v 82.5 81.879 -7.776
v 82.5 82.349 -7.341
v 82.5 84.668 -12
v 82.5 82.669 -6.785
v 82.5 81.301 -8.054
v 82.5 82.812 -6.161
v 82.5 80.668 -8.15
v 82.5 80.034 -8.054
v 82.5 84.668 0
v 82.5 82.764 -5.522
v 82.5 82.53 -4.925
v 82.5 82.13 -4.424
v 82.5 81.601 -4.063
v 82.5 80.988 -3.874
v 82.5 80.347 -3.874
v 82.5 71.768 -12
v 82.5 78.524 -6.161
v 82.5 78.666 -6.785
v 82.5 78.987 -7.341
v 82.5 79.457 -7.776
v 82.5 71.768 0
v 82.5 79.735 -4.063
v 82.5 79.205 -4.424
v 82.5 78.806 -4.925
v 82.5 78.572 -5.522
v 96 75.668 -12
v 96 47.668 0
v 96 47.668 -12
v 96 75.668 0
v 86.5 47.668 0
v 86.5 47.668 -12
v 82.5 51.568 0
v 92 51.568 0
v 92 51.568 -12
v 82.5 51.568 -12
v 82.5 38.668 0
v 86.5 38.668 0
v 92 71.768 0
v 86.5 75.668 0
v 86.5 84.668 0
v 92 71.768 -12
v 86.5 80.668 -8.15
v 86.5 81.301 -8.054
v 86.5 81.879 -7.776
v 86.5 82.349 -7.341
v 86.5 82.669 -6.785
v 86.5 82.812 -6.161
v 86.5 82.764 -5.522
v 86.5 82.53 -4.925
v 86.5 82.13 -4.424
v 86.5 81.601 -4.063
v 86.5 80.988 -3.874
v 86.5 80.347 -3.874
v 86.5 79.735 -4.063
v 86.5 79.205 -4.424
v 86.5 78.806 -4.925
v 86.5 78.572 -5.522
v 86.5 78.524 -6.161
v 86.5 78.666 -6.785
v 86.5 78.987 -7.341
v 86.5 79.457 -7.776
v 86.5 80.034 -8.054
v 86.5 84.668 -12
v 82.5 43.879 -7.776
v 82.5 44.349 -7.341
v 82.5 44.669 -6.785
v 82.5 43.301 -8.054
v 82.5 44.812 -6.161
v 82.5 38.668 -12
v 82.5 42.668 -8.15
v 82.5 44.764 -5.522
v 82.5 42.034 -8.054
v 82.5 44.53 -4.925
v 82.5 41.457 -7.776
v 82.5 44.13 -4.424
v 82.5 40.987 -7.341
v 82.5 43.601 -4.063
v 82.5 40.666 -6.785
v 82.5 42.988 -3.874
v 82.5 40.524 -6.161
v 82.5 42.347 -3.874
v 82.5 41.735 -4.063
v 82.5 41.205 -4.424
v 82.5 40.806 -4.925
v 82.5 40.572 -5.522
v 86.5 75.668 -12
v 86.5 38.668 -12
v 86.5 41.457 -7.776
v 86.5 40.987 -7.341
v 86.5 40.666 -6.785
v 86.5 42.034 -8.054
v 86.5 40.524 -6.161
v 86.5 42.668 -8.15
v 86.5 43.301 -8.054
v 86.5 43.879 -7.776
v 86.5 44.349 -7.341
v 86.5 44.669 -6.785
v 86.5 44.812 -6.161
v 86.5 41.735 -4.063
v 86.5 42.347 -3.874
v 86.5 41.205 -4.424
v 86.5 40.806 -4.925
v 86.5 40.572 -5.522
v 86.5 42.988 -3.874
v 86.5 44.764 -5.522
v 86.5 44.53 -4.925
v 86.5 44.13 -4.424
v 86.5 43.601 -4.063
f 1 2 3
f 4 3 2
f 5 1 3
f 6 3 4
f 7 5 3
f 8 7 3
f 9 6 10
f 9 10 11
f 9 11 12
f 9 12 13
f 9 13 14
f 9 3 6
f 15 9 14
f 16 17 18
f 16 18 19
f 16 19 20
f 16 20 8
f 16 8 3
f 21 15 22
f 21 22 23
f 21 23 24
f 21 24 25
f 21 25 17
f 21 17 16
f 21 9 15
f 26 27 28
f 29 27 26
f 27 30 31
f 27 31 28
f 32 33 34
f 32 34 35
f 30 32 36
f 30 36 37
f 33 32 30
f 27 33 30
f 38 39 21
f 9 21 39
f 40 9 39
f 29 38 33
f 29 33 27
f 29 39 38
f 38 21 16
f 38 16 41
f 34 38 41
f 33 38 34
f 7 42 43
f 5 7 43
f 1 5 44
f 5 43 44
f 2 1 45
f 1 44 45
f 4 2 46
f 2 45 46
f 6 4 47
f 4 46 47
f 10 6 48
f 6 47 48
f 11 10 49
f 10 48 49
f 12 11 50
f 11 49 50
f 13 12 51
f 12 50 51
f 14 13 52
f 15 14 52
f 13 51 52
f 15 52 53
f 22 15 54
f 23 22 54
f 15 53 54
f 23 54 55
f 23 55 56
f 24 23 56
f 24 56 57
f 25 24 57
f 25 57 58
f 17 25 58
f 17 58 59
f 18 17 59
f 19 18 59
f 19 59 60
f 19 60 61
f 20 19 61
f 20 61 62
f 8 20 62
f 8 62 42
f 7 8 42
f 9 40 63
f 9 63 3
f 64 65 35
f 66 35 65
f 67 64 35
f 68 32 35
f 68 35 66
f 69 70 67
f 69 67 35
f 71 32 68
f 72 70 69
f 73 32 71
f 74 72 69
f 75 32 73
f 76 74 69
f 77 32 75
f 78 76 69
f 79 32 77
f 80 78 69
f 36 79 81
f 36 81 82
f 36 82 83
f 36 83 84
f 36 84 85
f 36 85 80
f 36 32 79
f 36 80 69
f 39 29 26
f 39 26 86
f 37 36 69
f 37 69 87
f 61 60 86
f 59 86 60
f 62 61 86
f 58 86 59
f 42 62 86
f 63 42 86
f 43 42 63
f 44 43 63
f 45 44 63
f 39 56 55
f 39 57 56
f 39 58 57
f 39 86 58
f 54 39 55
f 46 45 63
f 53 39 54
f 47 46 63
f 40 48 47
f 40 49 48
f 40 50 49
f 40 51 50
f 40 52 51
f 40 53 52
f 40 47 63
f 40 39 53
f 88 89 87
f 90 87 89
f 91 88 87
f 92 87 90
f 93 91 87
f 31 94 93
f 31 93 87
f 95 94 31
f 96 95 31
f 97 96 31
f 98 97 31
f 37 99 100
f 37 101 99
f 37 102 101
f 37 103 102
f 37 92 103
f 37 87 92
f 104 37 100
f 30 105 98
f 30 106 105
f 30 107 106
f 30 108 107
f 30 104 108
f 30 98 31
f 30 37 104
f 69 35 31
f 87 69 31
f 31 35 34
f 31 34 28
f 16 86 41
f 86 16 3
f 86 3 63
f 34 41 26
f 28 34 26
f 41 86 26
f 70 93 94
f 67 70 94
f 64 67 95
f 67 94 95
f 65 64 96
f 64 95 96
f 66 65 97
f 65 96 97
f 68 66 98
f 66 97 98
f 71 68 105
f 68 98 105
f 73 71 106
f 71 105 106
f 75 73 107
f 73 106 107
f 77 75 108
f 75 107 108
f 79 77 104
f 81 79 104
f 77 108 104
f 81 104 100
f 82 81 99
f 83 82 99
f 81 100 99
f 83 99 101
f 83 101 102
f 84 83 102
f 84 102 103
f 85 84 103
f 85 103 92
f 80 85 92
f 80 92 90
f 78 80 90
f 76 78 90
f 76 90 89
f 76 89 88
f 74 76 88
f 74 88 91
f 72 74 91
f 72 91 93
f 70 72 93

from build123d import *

# Parameters (mm, degrees)
BOSS_EXTRUDE1_DEPTH = 12
SKETCH2_R           = 2.15
CUT_EXTRUDE1_DEPTH  = 39


with BuildPart() as part:
    # Sketch1 → Boss-Extrude1 (new body)
    with BuildSketch(Plane.XY):
        Polygon((82.5, 84.667703031), (82.5, 71.767703031), (92, 71.767703031), (92, 51.567703031), (82.5, 51.567703031), (82.5, 38.667703031), (86.5, 38.667703031), (86.5, 47.667703031), (96, 47.667703031), (96, 75.667703031), (86.5, 75.667703031), (86.5, 84.667703031), align=None)
    extrude(amount=-BOSS_EXTRUDE1_DEPTH)

    # Sketch2 → Cut-Extrude1 (cut)
    with BuildSketch(Plane(origin=(86.5, 0, 0), x_dir=(0, 0, -1), z_dir=(1, 0, 0))):
        with Locations((6, 42.667703031)):
            Circle(SKETCH2_R)
        with Locations((6, 80.667703031)):
            Circle(SKETCH2_R)
    extrude(amount=-CUT_EXTRUDE1_DEPTH, mode=Mode.SUBTRACT)


solid = part.part
